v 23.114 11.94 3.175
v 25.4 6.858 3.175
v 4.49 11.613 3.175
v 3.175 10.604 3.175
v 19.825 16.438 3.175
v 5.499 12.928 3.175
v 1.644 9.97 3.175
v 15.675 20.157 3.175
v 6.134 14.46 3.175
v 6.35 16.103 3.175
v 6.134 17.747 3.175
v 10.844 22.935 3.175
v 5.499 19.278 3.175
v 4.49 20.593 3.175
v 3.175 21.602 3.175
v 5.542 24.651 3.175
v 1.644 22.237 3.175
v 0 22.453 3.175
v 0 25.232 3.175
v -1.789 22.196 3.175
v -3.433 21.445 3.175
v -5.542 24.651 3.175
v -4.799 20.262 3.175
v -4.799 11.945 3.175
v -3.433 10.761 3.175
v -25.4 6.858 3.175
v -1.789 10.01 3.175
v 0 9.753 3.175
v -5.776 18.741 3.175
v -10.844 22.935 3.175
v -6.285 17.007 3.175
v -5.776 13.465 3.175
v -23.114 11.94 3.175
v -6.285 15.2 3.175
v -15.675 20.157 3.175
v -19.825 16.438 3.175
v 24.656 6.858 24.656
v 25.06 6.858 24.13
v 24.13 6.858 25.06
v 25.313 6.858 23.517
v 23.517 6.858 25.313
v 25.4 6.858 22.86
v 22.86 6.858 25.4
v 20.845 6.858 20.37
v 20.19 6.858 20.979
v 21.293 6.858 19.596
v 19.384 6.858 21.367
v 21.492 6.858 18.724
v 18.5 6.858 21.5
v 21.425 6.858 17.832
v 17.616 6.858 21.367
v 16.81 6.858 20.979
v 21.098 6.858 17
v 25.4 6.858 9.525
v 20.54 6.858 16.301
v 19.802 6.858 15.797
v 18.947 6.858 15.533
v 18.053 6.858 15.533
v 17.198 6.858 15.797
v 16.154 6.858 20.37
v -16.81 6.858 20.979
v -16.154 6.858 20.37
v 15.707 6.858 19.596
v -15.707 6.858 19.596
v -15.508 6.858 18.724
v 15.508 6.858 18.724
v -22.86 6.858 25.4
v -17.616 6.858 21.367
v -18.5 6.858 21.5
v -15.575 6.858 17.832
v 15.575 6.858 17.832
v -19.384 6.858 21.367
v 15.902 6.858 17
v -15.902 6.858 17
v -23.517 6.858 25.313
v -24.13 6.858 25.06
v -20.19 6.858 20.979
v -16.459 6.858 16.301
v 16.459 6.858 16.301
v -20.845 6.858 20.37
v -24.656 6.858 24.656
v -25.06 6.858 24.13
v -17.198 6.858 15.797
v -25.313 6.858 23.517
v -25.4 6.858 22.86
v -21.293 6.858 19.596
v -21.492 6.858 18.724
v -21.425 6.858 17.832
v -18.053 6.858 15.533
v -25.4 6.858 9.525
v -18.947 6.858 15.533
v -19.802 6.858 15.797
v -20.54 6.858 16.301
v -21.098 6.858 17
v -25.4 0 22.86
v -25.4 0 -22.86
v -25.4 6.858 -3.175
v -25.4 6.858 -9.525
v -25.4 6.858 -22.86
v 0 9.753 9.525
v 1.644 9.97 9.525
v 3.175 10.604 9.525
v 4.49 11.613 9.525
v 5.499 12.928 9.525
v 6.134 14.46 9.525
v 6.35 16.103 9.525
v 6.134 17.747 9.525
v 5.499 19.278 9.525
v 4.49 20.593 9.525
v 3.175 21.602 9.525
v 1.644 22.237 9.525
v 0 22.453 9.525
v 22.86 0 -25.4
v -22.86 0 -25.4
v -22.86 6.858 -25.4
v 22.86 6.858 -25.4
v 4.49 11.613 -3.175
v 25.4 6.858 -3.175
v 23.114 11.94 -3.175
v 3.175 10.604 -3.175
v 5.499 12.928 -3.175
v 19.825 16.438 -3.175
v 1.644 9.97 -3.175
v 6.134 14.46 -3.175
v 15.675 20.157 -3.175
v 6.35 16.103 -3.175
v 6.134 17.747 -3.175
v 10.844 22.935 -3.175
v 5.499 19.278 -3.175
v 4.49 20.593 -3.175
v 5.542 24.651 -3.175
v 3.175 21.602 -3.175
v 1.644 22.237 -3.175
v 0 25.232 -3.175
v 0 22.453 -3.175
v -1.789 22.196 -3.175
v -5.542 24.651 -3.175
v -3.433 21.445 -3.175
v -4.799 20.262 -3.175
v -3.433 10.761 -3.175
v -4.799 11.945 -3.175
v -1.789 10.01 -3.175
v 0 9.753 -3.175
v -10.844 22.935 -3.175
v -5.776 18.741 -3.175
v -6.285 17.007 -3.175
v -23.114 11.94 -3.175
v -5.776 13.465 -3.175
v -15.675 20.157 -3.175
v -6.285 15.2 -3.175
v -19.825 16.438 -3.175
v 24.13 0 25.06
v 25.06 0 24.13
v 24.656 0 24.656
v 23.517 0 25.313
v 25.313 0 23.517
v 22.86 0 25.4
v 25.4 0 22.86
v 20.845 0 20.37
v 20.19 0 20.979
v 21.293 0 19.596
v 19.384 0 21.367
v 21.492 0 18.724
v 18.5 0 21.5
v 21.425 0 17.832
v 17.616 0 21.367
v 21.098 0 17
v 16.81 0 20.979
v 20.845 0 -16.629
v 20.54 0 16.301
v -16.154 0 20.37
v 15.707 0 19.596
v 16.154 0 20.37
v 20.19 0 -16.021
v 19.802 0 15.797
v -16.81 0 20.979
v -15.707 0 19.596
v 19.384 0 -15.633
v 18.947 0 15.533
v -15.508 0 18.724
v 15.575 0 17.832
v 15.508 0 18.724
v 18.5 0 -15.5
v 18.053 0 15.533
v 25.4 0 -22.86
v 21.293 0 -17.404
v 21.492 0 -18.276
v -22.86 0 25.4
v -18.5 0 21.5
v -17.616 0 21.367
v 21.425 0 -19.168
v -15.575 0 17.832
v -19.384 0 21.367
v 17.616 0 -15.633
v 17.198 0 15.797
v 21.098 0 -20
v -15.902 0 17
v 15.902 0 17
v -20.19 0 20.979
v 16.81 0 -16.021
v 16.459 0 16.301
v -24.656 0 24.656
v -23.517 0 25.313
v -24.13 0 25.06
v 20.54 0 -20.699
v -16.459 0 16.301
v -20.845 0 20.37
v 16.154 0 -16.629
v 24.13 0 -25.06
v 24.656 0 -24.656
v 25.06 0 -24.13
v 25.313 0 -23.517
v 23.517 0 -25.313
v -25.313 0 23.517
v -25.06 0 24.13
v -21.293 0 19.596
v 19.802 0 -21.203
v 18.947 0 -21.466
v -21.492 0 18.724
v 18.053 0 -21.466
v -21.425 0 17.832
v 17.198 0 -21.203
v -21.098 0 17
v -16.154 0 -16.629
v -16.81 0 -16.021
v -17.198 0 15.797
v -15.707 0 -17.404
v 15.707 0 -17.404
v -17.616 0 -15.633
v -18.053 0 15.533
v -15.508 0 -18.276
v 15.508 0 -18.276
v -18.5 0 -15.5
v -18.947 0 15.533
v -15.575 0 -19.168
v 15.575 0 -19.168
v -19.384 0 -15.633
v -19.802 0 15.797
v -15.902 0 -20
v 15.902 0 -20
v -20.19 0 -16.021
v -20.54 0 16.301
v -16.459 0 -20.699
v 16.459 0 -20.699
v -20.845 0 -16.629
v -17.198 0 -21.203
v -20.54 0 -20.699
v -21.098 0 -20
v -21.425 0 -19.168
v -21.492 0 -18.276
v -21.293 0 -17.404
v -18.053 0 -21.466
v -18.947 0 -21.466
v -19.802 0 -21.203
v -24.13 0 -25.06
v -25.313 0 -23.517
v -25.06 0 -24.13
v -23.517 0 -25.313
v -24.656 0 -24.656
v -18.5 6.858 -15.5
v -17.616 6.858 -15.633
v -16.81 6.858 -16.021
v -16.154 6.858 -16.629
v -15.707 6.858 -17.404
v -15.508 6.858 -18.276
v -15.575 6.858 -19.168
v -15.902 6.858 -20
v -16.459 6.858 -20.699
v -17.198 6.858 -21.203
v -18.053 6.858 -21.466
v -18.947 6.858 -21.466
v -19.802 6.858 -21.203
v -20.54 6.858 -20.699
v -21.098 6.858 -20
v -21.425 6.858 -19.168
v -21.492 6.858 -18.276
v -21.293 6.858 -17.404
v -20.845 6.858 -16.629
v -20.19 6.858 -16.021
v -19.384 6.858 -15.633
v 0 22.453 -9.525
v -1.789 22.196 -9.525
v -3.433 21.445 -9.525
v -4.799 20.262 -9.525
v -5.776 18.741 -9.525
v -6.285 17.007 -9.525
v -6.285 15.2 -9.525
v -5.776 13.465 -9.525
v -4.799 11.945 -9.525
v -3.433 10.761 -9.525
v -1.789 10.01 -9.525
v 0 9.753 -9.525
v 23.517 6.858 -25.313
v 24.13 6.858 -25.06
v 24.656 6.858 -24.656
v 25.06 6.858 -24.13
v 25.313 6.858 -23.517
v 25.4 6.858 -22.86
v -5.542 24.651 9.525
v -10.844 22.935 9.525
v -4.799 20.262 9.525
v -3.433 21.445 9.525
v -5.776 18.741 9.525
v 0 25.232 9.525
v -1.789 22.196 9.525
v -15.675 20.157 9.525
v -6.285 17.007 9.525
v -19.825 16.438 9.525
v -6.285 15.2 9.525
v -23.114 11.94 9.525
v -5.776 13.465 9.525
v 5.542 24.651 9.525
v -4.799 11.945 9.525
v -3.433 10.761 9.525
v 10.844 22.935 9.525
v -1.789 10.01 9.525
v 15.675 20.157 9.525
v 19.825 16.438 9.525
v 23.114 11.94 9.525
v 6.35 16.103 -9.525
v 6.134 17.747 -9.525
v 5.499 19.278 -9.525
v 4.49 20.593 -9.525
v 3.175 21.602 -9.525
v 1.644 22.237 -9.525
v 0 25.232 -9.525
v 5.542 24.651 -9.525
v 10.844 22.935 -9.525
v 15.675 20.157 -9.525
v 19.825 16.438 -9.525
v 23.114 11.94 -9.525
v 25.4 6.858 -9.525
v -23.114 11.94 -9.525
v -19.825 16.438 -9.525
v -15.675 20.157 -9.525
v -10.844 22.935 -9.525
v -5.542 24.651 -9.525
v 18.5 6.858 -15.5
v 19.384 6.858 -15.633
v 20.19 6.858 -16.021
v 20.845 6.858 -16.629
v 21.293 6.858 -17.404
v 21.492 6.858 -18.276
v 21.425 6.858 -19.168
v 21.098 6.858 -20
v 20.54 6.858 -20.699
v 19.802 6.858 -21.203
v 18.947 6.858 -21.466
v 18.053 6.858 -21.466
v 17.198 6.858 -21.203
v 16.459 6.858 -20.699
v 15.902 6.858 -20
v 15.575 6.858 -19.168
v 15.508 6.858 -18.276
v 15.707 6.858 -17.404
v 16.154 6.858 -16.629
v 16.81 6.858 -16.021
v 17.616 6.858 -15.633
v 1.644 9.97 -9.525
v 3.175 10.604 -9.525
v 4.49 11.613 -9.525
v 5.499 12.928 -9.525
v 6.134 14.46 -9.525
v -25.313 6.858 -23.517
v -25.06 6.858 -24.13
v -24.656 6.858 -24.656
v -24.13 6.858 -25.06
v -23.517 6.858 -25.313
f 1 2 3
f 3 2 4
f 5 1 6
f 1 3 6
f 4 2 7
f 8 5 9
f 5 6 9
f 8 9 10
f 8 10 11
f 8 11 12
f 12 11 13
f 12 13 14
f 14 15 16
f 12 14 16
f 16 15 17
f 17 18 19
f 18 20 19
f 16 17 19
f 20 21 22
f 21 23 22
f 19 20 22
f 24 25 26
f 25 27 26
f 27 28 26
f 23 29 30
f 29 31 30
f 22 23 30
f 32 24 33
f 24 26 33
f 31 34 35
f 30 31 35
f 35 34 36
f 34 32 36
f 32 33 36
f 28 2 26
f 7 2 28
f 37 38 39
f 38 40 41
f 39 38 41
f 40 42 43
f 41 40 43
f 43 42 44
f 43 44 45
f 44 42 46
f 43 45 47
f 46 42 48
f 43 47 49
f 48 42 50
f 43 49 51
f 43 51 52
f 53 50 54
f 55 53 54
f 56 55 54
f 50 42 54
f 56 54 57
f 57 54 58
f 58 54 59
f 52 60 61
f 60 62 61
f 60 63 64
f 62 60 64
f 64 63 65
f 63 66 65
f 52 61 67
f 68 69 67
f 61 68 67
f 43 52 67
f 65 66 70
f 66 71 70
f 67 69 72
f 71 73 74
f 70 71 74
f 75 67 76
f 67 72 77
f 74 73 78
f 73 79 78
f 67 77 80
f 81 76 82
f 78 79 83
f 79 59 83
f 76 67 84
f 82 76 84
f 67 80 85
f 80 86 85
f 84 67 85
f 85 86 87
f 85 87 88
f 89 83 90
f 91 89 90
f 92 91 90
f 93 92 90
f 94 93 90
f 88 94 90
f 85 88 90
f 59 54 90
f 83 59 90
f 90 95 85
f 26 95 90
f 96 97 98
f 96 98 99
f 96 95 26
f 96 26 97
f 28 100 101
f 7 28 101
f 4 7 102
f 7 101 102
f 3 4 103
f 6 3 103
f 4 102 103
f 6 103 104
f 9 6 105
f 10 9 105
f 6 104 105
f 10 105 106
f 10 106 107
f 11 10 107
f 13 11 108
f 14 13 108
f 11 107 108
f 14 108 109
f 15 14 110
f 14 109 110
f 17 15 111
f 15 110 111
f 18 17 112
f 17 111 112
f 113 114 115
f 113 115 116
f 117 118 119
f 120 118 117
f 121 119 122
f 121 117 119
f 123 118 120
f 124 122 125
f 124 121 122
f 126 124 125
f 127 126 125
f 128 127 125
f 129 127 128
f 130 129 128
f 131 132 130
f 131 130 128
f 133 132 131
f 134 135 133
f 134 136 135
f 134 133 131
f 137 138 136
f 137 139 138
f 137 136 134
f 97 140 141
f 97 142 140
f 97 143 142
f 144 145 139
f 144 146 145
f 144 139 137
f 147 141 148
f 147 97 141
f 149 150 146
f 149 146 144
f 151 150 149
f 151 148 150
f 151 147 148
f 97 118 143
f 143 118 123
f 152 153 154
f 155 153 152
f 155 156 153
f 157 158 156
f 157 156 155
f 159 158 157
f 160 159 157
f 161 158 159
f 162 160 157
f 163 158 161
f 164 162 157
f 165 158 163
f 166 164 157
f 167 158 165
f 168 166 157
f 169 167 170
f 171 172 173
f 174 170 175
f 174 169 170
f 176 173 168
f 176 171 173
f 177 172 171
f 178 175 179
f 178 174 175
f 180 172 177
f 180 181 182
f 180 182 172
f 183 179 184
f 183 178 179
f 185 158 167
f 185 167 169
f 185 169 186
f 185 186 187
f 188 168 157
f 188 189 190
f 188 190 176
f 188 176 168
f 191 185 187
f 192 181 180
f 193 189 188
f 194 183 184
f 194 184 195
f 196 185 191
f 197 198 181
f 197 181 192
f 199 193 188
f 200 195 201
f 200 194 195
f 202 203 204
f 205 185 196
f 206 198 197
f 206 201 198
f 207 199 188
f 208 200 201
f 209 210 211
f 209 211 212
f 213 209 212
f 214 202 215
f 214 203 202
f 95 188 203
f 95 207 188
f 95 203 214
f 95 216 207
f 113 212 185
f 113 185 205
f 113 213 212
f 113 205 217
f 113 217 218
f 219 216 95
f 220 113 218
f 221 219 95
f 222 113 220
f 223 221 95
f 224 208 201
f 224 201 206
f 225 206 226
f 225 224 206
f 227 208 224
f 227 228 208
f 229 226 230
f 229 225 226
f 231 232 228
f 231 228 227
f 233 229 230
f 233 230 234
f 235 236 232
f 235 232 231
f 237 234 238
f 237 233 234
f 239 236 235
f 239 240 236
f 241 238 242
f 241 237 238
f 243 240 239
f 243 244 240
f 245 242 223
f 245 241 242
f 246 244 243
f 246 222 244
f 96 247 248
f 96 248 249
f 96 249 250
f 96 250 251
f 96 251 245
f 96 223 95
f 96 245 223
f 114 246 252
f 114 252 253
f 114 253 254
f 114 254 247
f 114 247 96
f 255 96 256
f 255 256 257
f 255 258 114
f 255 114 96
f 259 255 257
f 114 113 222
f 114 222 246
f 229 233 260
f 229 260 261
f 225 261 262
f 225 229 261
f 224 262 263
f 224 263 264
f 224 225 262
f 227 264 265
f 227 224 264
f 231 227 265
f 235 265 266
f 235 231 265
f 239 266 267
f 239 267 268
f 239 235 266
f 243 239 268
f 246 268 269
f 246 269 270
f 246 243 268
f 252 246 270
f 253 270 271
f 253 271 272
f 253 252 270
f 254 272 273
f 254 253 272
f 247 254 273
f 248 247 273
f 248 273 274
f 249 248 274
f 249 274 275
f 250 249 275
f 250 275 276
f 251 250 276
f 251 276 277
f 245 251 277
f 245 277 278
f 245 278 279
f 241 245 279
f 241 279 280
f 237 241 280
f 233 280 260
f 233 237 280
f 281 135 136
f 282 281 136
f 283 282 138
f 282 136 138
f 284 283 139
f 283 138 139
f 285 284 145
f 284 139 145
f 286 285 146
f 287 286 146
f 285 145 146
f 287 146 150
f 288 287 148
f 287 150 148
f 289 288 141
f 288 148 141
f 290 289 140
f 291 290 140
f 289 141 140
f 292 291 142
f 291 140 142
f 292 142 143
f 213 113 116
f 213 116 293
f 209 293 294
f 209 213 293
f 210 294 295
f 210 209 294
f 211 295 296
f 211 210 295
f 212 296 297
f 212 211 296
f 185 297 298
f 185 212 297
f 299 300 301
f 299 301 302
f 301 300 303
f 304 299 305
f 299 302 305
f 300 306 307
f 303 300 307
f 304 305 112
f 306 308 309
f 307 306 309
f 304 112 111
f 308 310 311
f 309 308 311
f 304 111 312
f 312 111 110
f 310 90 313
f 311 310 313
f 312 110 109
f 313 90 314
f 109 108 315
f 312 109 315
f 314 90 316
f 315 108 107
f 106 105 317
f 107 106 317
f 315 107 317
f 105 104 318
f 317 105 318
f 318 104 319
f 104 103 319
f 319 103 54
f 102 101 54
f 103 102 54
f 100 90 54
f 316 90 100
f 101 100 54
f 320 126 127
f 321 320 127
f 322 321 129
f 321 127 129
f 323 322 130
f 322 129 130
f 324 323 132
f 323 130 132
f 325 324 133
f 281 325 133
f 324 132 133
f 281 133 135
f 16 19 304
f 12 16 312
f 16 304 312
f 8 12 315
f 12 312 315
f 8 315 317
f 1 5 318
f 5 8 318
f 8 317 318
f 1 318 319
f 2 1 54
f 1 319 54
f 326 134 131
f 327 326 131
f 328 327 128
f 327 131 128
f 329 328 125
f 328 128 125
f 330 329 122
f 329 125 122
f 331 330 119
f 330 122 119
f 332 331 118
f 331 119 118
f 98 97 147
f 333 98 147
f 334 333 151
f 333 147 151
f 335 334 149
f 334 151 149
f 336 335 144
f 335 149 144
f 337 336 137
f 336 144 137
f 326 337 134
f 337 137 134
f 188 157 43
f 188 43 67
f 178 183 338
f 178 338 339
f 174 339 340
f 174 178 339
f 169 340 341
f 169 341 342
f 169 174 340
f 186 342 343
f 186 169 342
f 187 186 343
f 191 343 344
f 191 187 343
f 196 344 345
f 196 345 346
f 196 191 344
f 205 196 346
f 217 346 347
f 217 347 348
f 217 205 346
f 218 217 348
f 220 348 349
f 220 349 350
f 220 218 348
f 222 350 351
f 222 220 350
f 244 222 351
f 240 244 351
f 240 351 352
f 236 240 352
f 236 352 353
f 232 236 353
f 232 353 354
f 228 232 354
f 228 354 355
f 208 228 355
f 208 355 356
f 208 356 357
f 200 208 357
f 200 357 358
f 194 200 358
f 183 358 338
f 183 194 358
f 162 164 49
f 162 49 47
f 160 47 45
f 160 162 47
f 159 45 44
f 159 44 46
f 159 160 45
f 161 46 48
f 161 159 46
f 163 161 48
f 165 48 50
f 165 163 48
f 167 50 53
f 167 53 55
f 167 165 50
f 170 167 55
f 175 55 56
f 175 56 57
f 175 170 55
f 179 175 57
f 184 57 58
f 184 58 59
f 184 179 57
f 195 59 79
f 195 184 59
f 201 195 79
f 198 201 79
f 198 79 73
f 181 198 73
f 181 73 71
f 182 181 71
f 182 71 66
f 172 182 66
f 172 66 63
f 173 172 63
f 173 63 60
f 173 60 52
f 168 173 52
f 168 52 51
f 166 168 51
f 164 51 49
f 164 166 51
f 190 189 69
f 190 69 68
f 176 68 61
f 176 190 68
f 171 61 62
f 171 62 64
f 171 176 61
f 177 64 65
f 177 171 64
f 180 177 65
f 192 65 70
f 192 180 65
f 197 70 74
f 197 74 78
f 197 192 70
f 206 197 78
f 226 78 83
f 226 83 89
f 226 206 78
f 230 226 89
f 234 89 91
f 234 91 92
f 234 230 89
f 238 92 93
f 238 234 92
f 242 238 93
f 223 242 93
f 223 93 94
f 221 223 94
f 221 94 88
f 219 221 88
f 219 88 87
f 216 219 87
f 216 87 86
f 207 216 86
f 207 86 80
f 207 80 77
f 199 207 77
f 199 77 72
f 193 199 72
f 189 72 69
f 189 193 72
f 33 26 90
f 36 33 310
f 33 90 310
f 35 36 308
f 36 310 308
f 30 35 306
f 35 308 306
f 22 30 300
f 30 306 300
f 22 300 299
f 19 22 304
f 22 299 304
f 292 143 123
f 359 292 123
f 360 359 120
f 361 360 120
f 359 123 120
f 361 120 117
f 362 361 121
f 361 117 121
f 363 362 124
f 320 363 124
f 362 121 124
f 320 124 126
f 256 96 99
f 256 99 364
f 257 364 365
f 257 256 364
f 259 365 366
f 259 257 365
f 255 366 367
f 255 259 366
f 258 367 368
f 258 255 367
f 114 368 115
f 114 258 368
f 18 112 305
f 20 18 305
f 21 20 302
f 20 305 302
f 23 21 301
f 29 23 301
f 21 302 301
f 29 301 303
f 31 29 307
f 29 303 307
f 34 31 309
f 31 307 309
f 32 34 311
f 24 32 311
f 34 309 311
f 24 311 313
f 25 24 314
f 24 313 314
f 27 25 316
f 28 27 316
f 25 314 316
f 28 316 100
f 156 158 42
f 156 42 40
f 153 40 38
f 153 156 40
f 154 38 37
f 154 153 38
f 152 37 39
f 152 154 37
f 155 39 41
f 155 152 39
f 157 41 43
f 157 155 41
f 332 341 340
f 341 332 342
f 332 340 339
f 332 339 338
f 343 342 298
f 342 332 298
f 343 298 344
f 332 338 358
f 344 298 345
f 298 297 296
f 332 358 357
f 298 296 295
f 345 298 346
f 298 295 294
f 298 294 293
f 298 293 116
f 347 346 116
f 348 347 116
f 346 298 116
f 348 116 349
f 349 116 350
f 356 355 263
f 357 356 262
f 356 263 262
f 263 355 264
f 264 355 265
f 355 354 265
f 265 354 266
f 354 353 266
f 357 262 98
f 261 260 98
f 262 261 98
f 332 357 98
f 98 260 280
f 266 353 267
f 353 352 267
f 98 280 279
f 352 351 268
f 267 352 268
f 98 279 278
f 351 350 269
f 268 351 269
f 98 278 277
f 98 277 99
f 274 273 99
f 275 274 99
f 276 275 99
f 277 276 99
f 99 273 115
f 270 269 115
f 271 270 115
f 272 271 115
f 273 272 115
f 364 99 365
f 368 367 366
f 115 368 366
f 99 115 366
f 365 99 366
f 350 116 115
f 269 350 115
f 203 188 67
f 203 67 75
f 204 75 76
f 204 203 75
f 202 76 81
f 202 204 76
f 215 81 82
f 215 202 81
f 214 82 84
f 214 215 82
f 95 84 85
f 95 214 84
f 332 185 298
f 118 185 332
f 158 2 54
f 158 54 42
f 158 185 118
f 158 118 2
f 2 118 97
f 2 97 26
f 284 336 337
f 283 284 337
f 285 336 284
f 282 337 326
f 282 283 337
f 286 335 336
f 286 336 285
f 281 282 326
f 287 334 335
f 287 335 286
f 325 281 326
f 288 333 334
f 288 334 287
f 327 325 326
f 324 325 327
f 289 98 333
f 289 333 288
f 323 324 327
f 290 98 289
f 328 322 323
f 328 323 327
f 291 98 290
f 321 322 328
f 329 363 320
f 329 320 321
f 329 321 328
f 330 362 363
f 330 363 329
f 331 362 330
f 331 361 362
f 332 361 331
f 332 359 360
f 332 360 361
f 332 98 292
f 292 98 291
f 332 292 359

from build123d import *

# Parameters (mm, degrees)
SKETCH1_R           = 2.999994
BOSS_EXTRUDE1_DEPTH = 6.858
SKETCH2_W           = 50.8
SKETCH2_H           = 9.525
BOSS_EXTRUDE2_DEPTH = 24.892
CUT_EXTRUDE1_DEPTH  = 24.892
SKETCH4_W           = 6.35
SKETCH4_H           = 18.373928642
CUT_EXTRUDE2_DEPTH  = 58.166


with BuildPart() as part:
    # Sketch1 → Boss-Extrude1 (new body)
    with BuildSketch(Plane(origin=(0, 0, 0), x_dir=(1, 0, 0), z_dir=(0, 1, 0))):
        with BuildLine():
            Line((22.86, -25.4), (-22.86, -25.4))
            ThreePointArc((-22.86, -25.4), (-24.656051224, -24.656051224), (-25.4, -22.86))
            Line((-25.4, -22.86), (-25.4, 22.86))
            ThreePointArc((-25.4, 22.86), (-24.656051224, 24.656051224), (-22.86, 25.4))
            Line((-22.86, 25.4), (22.86, 25.4))
            ThreePointArc((22.86, 25.4), (24.656051224, 24.656051224), (25.4, 22.86))
            Line((25.4, 22.86), (25.4, -22.86))
            ThreePointArc((25.4, -22.86), (24.656051224, -24.656051224), (22.86, -25.4))
        make_face()
        with Locations(Location((-18.499963, 18.499963, 0), (0, 0, 270))):
            Circle(SKETCH1_R, mode=Mode.SUBTRACT)
        with Locations(Location((18.499963, 18.499963, 0), (0, 0, 270))):
            Circle(SKETCH1_R, mode=Mode.SUBTRACT)
        with Locations(Location((18.499963, -18.499963, 0), (0, 0, 270))):
            Circle(SKETCH1_R, mode=Mode.SUBTRACT)
        with Locations(Location((-18.499963, -18.499963, 0), (0, 0, 270))):
            Circle(SKETCH1_R, mode=Mode.SUBTRACT)
    extrude(amount=BOSS_EXTRUDE1_DEPTH)

    # Sketch2 → Boss-Extrude2 (add)
    with BuildSketch(Plane(origin=(0, 6.858, 0), x_dir=(1, 0, 0), z_dir=(0, 1, 0))):
        with Locations((0, -4.7625)):
            Rectangle(SKETCH2_W, SKETCH2_H)
        with Locations((0, 4.7625)):
            Rectangle(SKETCH2_W, SKETCH2_H)
    extrude(amount=BOSS_EXTRUDE2_DEPTH)

    # Sketch3 → Cut-Extrude1 (cut)
    with BuildSketch(Plane.XY.offset(9.525)):
        with BuildLine():
            ThreePointArc((6.35, 16.103217479), (4.490128061, 20.593345539), (0, 22.453217479))
            Line((0, 22.453217479), (0, 9.753217479))
            ThreePointArc((0, 9.753217479), (4.490128061, 11.613089418), (6.35, 16.103217479))
        make_face()
        with BuildLine():
            Line((0, 9.753217479), (0, 22.453217479))
            ThreePointArc((0, 22.453217479), (-6.35, 16.103217479), (0, 9.753217479))
        make_face()
        with BuildLine():
            Line((25.4, 31.75), (0, 31.75))
            Line((0, 31.75), (0, 25.231928642))
            ThreePointArc((0, 25.231928642), (15.674511585, 20.156909879), (25.4, 6.858))
            Line((25.4, 6.858), (25.4, 31.75))
        make_face()
        with BuildLine():
            Line((0, 25.231928642), (0, 31.75))
            Line((0, 31.75), (-25.4, 31.75))
            Line((-25.4, 31.75), (-25.4, 6.858))
            ThreePointArc((-25.4, 6.858), (-15.674511585, 20.156909879), (0, 25.231928642))
        make_face()
    extrude(amount=-CUT_EXTRUDE1_DEPTH, mode=Mode.SUBTRACT)

    # Sketch4 → Cut-Extrude2 (cut)
    with BuildSketch(Plane.ZY.offset(25.4)):
        with Locations((0, 16.044964321)):
            Rectangle(SKETCH4_W, SKETCH4_H)
    extrude(amount=-CUT_EXTRUDE2_DEPTH, mode=Mode.SUBTRACT)


solid = part.part
